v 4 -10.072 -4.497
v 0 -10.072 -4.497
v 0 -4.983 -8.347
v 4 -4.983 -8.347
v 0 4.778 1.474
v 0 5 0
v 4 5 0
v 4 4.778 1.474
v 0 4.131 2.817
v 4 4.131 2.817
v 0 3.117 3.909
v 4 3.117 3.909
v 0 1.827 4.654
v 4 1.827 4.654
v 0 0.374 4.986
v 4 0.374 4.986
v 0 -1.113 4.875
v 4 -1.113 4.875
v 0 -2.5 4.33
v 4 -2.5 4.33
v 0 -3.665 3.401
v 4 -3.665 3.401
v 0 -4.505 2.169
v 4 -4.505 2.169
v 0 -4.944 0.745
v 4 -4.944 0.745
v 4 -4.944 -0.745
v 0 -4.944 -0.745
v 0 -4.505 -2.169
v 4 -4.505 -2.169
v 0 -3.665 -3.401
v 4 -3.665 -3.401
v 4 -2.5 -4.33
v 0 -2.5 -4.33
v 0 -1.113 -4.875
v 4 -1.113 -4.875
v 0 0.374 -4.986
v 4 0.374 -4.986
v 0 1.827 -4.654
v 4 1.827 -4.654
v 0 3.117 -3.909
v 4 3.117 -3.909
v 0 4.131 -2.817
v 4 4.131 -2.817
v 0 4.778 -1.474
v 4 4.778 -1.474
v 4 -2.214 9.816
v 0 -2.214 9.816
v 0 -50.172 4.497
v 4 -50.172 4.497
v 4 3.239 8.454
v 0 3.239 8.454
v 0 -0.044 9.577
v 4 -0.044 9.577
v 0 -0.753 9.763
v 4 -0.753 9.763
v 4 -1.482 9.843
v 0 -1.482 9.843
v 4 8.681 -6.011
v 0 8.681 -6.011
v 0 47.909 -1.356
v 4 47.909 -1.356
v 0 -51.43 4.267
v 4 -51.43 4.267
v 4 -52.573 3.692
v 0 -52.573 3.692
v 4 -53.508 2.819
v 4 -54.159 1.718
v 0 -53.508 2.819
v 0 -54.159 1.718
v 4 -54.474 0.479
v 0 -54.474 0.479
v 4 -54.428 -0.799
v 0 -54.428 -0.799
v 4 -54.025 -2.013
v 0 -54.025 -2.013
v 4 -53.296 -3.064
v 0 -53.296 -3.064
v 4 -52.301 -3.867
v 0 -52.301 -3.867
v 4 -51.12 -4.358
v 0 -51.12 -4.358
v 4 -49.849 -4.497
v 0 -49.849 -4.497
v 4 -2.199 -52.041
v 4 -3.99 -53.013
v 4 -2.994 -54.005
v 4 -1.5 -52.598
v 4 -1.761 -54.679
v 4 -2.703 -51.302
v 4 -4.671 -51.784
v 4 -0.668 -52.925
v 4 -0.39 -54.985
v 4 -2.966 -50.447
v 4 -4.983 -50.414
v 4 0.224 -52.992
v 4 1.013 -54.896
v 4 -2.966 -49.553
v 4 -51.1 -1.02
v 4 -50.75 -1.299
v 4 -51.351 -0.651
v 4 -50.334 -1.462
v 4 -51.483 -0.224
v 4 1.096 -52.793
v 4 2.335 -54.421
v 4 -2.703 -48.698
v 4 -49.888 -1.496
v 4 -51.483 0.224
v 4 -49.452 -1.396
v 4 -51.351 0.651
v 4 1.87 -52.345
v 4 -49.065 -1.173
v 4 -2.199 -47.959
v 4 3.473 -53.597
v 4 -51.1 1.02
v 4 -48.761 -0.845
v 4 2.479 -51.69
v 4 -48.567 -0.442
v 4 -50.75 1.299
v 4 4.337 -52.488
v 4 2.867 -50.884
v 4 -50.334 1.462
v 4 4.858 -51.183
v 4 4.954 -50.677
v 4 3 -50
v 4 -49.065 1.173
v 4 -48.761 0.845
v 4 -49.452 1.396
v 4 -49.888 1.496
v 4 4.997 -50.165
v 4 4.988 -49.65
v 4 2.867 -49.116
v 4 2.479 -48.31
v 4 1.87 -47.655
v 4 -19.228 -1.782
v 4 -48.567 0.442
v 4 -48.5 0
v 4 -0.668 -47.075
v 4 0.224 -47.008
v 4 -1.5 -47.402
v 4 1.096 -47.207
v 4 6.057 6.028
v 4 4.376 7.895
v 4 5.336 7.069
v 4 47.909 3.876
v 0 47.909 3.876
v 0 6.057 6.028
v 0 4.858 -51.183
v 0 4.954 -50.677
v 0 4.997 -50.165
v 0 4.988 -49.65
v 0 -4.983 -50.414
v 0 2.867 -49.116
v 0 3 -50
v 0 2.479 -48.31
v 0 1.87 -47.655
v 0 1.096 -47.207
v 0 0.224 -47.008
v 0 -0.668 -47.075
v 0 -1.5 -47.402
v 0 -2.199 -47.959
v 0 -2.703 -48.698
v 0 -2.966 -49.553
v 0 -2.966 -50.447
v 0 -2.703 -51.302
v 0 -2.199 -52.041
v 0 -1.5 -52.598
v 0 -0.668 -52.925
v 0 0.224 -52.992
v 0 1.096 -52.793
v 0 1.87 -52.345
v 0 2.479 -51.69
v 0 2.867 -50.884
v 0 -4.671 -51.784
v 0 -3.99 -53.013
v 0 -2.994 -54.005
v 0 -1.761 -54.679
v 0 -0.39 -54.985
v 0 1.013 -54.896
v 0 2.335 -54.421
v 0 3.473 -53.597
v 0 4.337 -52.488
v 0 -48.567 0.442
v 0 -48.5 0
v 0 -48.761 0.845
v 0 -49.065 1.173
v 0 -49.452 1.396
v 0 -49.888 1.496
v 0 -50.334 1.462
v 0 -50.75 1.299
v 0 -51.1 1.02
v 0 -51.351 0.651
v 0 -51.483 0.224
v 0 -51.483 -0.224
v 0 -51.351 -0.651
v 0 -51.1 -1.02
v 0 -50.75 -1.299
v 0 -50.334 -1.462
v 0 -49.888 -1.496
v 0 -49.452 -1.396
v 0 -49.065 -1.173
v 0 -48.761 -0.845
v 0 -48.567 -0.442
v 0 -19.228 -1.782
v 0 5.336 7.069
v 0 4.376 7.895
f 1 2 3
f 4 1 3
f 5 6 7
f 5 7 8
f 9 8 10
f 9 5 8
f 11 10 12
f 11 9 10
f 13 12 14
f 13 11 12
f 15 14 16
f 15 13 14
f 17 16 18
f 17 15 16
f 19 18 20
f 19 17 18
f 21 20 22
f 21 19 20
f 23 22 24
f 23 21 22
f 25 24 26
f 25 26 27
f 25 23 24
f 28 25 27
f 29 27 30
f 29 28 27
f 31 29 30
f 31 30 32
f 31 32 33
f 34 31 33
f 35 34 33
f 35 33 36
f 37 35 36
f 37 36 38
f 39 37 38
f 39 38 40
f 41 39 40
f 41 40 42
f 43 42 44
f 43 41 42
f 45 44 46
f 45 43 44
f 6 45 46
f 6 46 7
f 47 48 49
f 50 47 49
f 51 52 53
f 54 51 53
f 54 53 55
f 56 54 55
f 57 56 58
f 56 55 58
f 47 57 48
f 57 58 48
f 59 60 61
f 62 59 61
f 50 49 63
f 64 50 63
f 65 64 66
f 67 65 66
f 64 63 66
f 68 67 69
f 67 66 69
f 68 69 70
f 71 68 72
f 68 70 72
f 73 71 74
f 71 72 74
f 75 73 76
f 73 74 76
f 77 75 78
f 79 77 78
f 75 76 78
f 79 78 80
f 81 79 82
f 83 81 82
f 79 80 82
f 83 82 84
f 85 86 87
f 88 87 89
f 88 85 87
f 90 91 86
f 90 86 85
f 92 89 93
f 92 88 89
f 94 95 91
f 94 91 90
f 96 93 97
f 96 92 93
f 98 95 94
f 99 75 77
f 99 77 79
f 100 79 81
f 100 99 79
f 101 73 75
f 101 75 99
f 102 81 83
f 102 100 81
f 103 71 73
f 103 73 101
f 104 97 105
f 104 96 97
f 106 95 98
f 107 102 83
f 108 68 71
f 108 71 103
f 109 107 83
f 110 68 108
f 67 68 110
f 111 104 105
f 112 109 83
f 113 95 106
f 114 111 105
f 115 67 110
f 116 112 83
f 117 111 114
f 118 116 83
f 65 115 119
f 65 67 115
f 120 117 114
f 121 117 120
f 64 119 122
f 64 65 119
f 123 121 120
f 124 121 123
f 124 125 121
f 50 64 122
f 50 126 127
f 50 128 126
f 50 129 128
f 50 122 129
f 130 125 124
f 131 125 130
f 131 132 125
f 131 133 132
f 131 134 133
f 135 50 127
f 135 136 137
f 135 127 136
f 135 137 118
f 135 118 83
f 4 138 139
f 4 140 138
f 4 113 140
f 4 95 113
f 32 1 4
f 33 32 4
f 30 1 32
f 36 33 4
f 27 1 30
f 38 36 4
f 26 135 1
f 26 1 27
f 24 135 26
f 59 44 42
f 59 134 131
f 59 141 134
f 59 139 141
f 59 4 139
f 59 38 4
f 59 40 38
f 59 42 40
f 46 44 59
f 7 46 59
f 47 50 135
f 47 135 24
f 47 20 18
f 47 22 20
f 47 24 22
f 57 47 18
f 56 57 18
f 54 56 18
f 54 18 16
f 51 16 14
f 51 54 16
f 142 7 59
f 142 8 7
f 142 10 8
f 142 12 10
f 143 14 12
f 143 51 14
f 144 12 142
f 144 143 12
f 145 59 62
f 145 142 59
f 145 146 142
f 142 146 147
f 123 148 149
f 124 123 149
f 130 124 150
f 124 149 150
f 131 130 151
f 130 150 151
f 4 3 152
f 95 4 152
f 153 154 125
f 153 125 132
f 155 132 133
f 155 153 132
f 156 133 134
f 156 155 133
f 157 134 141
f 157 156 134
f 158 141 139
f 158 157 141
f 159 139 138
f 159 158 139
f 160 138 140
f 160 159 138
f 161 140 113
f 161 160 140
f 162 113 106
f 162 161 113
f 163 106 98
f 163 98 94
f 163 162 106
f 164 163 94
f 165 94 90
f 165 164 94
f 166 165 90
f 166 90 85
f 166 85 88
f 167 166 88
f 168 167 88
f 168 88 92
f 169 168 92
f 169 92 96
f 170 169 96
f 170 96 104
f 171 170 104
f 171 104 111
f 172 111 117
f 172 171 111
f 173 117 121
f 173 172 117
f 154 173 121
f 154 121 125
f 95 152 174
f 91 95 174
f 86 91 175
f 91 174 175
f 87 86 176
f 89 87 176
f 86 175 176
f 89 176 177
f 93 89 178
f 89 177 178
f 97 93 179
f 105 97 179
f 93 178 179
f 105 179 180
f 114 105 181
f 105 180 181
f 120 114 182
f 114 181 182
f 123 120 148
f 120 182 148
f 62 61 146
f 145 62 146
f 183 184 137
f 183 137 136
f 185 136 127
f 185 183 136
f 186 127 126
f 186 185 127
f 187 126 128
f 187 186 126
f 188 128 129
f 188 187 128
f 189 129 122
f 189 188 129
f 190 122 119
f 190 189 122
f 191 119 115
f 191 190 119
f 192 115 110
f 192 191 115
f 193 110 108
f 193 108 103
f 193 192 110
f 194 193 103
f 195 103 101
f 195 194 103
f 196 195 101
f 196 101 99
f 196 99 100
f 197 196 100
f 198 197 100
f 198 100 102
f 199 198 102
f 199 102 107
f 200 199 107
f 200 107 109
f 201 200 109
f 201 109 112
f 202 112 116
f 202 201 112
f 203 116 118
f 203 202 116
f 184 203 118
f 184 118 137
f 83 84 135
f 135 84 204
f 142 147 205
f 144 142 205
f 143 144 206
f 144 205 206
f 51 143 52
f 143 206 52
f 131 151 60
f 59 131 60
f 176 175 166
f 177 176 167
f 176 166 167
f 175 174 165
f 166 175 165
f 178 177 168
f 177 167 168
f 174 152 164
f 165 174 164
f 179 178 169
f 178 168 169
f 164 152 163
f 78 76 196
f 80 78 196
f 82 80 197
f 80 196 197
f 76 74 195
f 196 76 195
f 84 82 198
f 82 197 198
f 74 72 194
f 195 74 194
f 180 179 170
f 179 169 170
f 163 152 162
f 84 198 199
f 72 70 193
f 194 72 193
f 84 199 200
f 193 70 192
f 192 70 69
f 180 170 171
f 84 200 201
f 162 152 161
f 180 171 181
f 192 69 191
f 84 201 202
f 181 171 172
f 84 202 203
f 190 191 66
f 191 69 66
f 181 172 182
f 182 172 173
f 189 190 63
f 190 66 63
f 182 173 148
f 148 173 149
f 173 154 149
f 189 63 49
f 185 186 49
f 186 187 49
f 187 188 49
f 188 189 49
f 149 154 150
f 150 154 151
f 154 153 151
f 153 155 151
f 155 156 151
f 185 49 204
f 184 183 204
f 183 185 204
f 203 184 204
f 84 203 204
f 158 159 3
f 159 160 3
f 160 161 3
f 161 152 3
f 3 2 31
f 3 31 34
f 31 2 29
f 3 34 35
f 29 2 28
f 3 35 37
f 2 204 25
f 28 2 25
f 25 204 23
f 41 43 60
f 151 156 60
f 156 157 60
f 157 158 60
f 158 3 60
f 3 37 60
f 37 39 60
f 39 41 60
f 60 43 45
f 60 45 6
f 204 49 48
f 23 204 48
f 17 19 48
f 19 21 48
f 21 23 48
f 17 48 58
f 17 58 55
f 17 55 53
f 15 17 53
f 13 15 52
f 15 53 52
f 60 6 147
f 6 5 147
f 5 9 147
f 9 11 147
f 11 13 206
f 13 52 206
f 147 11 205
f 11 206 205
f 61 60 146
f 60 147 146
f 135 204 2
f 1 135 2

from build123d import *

# Parameters (mm, degrees)
F0_R     = 3
F0_R_2   = 1.5
F0_R_3   = 5
F1_DEPTH = 4


with BuildPart() as f1:
    # F0 (on Right) → F1 (new body)
    with BuildSketch(Plane.YZ):
        with BuildLine():
            Line((-2.213923, 9.815771), (-50.172412, 4.496696))
            ThreePointArc((-50.172412, 4.496696), (-54.497093, -0.161719), (-49.848975, -4.497465))
            Line((-49.848975, -4.497465), (-19.228159, -1.781642))
            Line((-19.228159, -1.781642), (-10.071731, -4.497465))
            Line((-10.071731, -4.497465), (-4.982847, -8.347222))
            Line((-4.982847, -8.347222), (-4.982847, -50.413808))
            ThreePointArc((-4.982847, -50.413808), (-0.389649, -54.984794), (4.858025, -51.183044))
            Line((4.858025, -51.183044), (4.987747, -49.650171))
            Line((4.987747, -49.650171), (8.680819, -6.010615))
            Line((8.680819, -6.010615), (9.067407, -1.442462))
            ThreePointArc((9.067407, -1.442462), (8.988122, -0.04027), (8.522012, 1.284557))
            Line((8.522012, 1.284557), (6.057092, 6.02837))
            ThreePointArc((6.057092, 6.02837), (4.881819, 7.512762), (3.238884, 8.453747))
            Line((3.238884, 8.453747), (-0.044164, 9.577011))
            ThreePointArc((-0.044164, 9.577011), (-1.115855, 9.816243), (-2.213923, 9.815771))
        make_face()
        with Locations((0, -50)):
            Circle(F0_R, mode=Mode.SUBTRACT)
        with Locations((-50, 0)):
            Circle(F0_R_2, mode=Mode.SUBTRACT)
        Circle(F0_R_3, mode=Mode.SUBTRACT)
        with BuildLine():
            Line((47.908556, 3.875873), (6.057092, 6.02837))
            Line((6.057092, 6.02837), (8.522012, 1.284557))
            ThreePointArc((8.522012, 1.284557), (8.988122, -0.04027), (9.067407, -1.442462))
            Line((9.067407, -1.442462), (8.680819, -6.010615))
            Line((8.680819, -6.010615), (47.908556, -1.356372))
            Line((47.908556, -1.356372), (47.908556, 3.875873))
        make_face()
        with BuildLine():
            Line((4.987747, -49.650171), (4.858025, -51.183044))
            ThreePointArc((4.858025, -51.183044), (4.982191, -50.421626), (4.987747, -49.650171))
        make_face()
    extrude(amount=F1_DEPTH)


solid = f1.part
